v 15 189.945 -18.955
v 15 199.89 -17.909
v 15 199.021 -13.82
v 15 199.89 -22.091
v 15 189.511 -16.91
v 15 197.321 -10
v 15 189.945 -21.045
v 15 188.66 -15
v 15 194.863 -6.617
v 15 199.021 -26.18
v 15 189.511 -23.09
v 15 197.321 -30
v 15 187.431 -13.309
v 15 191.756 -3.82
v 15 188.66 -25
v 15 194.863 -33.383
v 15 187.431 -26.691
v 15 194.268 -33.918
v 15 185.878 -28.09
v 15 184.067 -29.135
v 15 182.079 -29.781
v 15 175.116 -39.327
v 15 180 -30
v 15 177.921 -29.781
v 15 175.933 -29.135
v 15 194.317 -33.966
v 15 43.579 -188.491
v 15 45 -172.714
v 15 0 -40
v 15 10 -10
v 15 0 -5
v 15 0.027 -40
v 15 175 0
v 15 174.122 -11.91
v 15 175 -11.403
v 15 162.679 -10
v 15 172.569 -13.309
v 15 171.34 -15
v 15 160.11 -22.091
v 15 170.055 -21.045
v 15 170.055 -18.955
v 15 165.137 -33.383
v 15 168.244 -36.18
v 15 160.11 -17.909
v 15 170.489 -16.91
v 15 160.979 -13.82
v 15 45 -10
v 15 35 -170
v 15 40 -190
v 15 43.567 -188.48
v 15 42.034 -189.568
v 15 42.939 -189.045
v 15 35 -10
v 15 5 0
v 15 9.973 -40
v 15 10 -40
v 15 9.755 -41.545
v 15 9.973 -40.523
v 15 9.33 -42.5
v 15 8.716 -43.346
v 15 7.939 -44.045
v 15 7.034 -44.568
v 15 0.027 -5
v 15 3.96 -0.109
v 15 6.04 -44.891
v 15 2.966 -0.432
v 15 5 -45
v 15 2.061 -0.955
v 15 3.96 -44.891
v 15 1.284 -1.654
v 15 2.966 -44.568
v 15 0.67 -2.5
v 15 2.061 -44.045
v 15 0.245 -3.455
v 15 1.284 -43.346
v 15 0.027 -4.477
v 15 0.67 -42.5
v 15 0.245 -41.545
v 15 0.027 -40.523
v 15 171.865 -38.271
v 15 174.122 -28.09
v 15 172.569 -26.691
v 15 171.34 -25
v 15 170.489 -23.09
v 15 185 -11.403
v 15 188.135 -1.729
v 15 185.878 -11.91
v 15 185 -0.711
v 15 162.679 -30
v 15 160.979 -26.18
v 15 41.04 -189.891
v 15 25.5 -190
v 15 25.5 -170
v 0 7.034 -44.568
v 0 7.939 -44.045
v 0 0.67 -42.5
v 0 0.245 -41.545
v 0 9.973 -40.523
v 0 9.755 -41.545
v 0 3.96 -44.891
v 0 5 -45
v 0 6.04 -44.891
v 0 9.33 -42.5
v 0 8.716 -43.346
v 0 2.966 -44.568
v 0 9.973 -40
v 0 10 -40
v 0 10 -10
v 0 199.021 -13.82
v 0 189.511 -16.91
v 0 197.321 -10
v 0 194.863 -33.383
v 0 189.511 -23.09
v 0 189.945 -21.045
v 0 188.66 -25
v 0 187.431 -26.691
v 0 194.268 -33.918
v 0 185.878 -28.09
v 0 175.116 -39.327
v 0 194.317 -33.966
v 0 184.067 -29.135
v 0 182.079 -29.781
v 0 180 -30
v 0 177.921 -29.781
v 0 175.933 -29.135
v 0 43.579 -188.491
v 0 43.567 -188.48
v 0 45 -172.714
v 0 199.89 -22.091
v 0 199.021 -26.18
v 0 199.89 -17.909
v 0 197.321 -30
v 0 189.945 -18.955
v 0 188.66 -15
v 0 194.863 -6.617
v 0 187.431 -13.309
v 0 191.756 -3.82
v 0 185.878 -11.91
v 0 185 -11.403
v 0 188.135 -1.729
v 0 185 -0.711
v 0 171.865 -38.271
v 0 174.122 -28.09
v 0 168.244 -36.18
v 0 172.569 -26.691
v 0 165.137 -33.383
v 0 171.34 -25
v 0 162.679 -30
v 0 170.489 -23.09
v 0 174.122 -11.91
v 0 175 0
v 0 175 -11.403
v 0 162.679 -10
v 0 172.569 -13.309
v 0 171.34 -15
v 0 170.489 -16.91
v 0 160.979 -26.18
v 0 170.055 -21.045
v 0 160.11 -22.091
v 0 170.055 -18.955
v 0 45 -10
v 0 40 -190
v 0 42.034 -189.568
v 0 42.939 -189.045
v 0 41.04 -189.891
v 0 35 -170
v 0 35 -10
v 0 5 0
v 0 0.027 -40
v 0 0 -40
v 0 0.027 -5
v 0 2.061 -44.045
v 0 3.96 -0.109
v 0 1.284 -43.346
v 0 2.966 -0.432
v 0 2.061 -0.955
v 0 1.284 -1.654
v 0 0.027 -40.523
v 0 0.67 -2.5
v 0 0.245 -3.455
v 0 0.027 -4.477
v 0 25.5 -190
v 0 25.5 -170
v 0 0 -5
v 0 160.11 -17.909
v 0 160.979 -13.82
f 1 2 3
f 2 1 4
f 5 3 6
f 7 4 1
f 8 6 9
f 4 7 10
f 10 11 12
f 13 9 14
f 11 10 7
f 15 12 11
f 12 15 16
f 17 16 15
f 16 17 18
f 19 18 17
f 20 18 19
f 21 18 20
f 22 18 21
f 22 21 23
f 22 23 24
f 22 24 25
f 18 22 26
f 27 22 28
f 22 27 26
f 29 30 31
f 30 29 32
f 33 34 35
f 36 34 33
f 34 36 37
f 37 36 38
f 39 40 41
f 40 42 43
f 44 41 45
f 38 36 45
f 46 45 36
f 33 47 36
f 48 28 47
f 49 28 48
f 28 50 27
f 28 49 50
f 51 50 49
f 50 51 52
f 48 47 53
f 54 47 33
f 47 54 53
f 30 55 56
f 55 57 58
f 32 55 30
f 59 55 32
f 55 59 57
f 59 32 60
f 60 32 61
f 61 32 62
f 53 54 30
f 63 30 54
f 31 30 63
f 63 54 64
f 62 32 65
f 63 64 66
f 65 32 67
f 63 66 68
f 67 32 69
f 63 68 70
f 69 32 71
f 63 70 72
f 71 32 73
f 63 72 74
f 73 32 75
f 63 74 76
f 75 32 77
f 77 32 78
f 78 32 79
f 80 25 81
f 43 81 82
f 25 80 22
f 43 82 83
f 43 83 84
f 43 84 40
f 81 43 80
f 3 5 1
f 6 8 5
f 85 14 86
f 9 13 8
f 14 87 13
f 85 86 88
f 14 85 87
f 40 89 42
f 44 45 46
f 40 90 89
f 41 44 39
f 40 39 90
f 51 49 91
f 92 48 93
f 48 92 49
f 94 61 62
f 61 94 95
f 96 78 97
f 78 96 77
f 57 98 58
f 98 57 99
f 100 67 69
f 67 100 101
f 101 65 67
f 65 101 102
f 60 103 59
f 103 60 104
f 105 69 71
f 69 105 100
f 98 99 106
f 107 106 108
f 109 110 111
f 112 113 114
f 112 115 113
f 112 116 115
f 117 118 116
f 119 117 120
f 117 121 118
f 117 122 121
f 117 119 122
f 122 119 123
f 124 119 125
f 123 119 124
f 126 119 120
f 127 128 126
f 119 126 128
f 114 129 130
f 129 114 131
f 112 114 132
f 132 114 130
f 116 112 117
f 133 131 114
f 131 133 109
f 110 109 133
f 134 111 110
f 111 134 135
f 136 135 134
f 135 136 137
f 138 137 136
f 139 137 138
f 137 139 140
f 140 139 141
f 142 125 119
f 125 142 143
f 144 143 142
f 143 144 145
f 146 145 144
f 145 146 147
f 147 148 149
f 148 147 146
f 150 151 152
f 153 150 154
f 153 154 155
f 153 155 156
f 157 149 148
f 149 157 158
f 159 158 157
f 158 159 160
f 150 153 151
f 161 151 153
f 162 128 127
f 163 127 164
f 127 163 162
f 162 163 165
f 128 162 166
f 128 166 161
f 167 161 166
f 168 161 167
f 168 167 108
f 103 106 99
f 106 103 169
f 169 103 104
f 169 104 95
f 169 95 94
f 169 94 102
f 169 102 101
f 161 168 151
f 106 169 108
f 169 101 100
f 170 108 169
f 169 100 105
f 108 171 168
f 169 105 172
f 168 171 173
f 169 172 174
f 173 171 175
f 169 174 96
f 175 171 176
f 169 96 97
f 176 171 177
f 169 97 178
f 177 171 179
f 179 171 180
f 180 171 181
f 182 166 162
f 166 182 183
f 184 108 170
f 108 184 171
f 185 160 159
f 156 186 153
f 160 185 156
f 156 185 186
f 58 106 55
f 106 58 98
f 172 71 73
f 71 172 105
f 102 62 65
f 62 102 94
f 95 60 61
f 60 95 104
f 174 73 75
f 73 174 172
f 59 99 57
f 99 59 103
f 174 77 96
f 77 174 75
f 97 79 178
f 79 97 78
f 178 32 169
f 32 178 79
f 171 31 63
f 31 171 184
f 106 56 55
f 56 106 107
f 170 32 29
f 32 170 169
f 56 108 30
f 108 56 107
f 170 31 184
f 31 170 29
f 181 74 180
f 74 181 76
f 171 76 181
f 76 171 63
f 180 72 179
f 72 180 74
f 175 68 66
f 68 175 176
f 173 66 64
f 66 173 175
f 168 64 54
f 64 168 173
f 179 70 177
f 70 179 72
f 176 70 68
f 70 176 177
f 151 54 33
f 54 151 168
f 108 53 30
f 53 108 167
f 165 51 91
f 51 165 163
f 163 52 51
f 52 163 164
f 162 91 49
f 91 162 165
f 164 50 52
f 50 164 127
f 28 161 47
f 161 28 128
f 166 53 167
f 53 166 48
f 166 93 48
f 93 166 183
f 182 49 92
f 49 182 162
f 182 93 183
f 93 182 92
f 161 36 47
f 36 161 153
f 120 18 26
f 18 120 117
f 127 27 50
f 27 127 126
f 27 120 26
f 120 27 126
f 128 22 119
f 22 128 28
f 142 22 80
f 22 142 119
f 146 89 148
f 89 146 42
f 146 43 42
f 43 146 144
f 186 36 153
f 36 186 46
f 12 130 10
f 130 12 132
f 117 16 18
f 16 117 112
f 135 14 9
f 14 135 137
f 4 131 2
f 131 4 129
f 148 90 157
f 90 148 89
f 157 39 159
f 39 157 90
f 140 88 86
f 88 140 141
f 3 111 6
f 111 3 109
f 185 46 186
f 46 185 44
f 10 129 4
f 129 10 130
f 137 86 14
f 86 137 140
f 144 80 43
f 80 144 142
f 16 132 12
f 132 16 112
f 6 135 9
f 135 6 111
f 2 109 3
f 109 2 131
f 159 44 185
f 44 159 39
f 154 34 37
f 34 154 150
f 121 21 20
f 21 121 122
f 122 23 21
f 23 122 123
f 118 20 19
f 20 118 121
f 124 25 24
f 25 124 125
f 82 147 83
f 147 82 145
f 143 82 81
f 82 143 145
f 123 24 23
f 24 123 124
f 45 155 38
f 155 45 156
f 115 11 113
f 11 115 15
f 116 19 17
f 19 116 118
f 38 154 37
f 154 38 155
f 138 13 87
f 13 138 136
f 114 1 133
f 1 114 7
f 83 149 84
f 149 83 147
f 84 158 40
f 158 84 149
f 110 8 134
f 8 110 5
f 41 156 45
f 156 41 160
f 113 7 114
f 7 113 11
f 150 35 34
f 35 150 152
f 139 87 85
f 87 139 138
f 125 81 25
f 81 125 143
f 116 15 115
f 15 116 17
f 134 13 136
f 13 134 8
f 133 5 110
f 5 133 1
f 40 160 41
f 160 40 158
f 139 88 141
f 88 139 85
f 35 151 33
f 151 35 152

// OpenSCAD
/* Customisable hook */

/* All lengths in millimetres */

// Length of horizontal arm from vertical support to the centre of the holder
arm_length = 140;

// Length of vertical support
support_length = 180;

// Diameter of holder
holder_diameter = 40;

// Cut a section out of the hook?
cutout = "Yes"; // ["Yes", "No"]

// Inside measurement along the top of the hook
hook_inside_top_length = 25;

// Inside measurement down the back of the hook
hook_inside_back_length = 25;

// Length of standoff to hold support from wall (set to 0 if not needed)
standoff_length = 9.5;

// Height of standoff
standoff_height = 20;

// Horizontal size - thicker is more sturdy
thickness = 15;

// Bulk - bulkier is more sturdy
bulk = 10;

// Smoothness
smoothness = 30; // [30: Rough, 60: Okay, 120: Good, 180: Very good]
$fn = smoothness;

/* Calculated values */

holder_radius = holder_diameter / 2;

holder_inside_radius = holder_radius - bulk;

hook_top_length = hook_inside_top_length + bulk;
hook_back_length = hook_inside_back_length + bulk;

triangle_length = sqrt(pow(sqrt(pow(arm_length,2)+pow(support_length-(holder_radius- bulk/2),2)),2)-pow((holder_radius- bulk/2),2));

triangle_angle = atan(arm_length/(support_length-(holder_radius- bulk/2)))+ atan((holder_radius-bulk/2)/triangle_length);

create_hook();

module create_hook() {
    translate([0,hook_back_length+bulk/2,0-bulk/2])
        difference() {
            union() {
                back_hook();
                structure();
                holder();
                }
                if (cutout == "Yes") {
                    cutout();
            }
        }
}

module back_hook() {
    /* Hook */
    /* Back of hook */
    translate([0,0-hook_top_length,0])
        union() {
            translate([0,0,0-hook_back_length])
                rotate([0,90,0])
                    cylinder(h = thickness, r = bulk/2);
            translate([0,0-bulk/2,0-hook_back_length])
                cube([thickness, bulk, hook_back_length]);
        }      
    /* Top of hook */
    translate([0,0-hook_top_length,0])
        union() {
            translate([0,0,0])
                rotate([0,90,0])
                    cylinder(h = thickness, r = bulk/2);
            translate([0,0,0-bulk/2])
                cube([thickness, hook_top_length, bulk]);
        }    
}


module structure() {
    /* Vertical support */
    translate([0,0,0-support_length])
        union() {
            translate([0,0,0])
                rotate([0,90,0])
                    cylinder(h = thickness, r = bulk/2);
            translate([0,0-bulk/2,0])
                cube([thickness, bulk, support_length]);
        }

    /* Standoff */
    translate([0,0-standoff_length-bulk/2,0-support_length-bulk/2])    
        cube([thickness, standoff_length+bulk/2, standoff_height]);

    /* Arm */
    translate([0,0,0-bulk/2])
        cube([thickness, arm_length, bulk]);
        
    /* Triangle */
    translate([0,0,0-support_length])
        rotate([0-triangle_angle,0,0])
            translate([0,0-bulk/2,0])
                cube([thickness, bulk, triangle_length]);    
}

module holder() {
    translate([0,arm_length,0-holder_radius+bulk/2])
        rotate([0,90,0])
            difference() {
                cylinder(h = thickness, r = holder_radius);
                translate([0,0,-1])
                    cylinder(h = thickness+2, r = holder_inside_radius);
            }    
}

module cutout () {
    translate([-1,arm_length-bulk/2,0-bulk])
        cube([thickness+2, bulk, bulk*2]);    
}
